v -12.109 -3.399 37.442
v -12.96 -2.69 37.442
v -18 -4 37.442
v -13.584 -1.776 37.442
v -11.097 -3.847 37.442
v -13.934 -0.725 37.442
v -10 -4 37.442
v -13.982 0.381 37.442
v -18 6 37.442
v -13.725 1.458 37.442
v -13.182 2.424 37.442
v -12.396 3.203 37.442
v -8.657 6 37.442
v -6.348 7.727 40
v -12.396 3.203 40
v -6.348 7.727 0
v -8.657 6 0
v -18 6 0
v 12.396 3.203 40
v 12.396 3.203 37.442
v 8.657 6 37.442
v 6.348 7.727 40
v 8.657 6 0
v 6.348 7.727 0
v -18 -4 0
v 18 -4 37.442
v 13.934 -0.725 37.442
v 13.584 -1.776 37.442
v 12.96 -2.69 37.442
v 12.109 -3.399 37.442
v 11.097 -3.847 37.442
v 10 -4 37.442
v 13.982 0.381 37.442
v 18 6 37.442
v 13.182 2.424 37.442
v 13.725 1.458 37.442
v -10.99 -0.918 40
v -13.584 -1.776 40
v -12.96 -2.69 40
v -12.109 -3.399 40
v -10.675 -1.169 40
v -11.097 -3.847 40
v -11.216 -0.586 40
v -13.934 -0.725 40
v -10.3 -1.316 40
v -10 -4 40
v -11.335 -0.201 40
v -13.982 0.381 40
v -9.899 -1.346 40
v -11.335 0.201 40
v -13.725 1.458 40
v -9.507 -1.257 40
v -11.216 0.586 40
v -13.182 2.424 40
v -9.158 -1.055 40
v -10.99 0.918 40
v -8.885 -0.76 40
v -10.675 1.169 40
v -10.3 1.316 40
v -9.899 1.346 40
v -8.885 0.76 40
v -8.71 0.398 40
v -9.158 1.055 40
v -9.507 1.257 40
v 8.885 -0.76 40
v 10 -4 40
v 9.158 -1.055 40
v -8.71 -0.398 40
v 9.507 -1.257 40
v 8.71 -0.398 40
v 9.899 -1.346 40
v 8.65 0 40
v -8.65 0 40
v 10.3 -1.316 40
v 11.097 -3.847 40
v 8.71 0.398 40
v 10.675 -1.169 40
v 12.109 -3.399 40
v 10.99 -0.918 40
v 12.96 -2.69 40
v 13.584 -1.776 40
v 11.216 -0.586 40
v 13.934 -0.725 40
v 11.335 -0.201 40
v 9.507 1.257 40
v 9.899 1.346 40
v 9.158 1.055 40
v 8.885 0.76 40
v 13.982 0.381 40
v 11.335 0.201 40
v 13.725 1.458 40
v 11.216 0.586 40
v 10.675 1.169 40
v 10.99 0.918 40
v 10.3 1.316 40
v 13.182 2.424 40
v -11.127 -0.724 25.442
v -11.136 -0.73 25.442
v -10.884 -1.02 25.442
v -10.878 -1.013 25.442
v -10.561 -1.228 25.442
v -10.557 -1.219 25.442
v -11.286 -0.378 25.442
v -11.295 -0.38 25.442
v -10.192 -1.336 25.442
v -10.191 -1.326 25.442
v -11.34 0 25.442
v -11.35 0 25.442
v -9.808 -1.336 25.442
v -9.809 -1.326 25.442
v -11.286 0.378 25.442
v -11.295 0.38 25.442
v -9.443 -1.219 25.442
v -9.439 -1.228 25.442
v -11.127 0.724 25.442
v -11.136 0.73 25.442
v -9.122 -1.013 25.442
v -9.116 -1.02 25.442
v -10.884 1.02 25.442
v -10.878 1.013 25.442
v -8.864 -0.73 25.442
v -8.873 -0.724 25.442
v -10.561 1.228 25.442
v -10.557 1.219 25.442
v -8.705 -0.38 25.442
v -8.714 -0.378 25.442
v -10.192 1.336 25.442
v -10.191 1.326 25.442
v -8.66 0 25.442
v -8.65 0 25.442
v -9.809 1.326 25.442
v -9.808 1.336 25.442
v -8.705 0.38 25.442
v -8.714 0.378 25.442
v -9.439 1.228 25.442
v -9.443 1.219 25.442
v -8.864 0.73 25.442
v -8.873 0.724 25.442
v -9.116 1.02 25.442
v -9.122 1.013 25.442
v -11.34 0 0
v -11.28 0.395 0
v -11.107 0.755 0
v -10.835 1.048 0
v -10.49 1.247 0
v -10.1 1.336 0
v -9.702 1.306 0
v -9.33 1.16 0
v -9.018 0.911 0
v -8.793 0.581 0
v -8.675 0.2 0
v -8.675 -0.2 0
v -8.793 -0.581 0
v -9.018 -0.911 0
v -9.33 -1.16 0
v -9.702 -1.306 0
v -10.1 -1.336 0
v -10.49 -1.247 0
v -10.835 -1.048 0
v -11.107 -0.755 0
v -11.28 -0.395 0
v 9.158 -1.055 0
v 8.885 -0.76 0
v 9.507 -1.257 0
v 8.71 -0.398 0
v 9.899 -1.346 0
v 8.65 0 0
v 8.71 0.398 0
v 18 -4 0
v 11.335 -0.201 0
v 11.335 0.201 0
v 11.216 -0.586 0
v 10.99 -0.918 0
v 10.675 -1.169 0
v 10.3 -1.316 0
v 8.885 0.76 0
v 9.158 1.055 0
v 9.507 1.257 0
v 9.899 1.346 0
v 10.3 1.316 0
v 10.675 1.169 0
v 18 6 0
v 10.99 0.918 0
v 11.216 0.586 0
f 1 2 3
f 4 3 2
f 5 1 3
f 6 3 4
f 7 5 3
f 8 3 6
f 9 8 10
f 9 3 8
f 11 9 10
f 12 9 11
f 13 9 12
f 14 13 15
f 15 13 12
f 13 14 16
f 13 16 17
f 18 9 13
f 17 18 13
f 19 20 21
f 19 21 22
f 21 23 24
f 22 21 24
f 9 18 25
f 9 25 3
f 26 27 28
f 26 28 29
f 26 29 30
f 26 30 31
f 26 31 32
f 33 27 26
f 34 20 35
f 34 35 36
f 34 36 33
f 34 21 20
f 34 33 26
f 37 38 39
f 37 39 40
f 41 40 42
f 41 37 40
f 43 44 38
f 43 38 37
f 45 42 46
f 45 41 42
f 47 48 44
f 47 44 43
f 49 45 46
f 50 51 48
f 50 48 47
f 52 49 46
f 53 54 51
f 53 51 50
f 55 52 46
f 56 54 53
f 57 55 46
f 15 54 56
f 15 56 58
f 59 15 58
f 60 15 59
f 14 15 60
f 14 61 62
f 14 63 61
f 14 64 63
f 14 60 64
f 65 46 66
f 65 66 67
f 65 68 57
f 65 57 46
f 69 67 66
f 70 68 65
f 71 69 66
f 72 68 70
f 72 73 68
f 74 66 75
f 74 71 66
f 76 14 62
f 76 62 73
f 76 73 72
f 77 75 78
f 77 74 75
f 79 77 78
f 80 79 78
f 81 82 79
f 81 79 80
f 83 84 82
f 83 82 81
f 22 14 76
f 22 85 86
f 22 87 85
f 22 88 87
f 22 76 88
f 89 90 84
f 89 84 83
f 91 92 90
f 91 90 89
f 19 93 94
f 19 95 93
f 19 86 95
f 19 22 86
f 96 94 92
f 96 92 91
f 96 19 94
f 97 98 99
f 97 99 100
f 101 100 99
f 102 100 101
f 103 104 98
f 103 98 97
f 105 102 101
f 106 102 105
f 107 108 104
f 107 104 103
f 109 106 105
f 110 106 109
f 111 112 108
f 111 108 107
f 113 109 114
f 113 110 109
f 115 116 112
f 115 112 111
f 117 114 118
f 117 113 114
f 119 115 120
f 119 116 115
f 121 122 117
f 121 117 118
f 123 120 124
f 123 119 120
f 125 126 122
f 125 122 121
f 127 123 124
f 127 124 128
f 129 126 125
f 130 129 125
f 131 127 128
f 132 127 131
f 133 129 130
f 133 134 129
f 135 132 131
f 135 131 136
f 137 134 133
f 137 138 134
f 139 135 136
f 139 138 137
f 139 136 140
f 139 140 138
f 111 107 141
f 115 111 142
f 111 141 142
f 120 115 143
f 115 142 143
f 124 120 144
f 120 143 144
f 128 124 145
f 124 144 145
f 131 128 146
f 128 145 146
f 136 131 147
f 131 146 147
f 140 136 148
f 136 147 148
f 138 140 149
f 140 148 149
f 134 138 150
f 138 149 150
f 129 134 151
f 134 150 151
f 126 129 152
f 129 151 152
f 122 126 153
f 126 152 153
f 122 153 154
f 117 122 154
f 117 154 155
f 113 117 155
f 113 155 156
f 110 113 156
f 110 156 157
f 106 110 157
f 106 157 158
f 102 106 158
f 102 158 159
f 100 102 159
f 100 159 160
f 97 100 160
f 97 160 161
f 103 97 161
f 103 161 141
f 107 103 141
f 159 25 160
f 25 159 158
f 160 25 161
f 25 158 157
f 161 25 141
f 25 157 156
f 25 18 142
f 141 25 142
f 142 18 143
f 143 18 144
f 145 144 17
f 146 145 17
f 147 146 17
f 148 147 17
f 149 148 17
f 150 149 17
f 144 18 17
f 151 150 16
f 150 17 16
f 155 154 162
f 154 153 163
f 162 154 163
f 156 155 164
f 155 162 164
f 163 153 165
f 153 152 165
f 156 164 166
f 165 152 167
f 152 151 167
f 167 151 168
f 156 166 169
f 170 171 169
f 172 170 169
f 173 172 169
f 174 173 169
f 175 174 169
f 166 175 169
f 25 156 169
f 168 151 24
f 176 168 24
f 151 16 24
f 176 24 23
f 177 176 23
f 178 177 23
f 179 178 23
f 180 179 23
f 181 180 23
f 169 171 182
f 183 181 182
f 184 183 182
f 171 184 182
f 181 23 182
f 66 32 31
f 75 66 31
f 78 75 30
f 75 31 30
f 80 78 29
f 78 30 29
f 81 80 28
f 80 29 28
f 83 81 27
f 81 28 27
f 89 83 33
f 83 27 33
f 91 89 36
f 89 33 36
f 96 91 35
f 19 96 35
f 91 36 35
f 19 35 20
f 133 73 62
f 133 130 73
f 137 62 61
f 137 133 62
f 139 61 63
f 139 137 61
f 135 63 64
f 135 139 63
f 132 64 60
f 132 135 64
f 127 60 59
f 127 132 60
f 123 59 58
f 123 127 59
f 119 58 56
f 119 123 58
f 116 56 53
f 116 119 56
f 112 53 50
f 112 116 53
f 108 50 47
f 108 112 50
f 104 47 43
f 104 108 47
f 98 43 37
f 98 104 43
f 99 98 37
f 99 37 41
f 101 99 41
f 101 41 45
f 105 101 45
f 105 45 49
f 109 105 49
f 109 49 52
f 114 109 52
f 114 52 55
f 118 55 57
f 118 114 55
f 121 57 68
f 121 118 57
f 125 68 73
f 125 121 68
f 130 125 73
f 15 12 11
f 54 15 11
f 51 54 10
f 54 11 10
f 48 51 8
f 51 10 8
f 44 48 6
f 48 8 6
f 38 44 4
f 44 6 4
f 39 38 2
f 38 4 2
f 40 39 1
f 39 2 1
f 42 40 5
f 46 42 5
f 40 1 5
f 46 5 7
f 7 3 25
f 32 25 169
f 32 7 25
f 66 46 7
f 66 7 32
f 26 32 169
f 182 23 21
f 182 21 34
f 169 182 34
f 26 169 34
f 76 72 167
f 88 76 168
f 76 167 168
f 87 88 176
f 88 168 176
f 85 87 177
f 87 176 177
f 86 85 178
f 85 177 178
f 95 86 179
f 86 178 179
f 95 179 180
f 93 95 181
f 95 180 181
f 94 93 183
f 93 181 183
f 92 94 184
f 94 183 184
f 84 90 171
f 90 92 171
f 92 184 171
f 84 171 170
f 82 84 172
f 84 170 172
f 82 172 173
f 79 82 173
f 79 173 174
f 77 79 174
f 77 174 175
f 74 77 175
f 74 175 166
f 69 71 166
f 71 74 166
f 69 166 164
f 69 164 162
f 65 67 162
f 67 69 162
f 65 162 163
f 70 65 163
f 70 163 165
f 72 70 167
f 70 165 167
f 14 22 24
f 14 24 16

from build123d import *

# Parameters (mm, degrees)
SKETCH_1_R          = 1.35
EXTRUDE_1_DEPTH     = 40
EXTRUDE_2_DEPTH     = 10
SKETCH_3_W          = 36
SKETCH_3_H          = 37.441664415
SKETCH_3_R          = 11
EXTRUDE_3_DEPTH     = 5
SKETCH_7_W          = 36
SKETCH_7_H          = 37.441664415
CUT_EXTRUDE_4_DEPTH = 5
CUT_EXTRUDE_START   = -12
SKETCH_8_R          = 1.35
CUT_EXTRUDE_5_DEPTH = 12
SKETCH_10_R         = 1.34
SKETCH_10_R_2       = 1.35
CUT_EXTRUDE_6_DEPTH = 52


with BuildPart() as part:
    # 草图1 → 凸台-拉伸1 (new body)
    with BuildSketch(Plane.XY):
        with BuildLine():
            Line((-10, -4), (10, -4))
            ThreePointArc((10, -4), (13.795550466, -1.262456597), (12.395858862, 3.203101671))
            Line((12.395858862, 3.203101671), (6.347732719, 7.726984491))
            Line((6.347732719, 7.726984491), (0, 7.726984491))
            Line((0, 7.726984491), (-6.347732719, 7.726984491))
            Line((-6.347732719, 7.726984491), (-12.395858862, 3.203101671))
            ThreePointArc((-12.395858862, 3.203101671), (-13.795550466, -1.262456597), (-10, -4))
        make_face()
        with Locations((10, 0)):
            Circle(SKETCH_1_R, mode=Mode.SUBTRACT)
        with Locations((-10, 0)):
            Circle(SKETCH_1_R, mode=Mode.SUBTRACT)
    extrude(amount=EXTRUDE_1_DEPTH)

    # 草图2 → 凸台-拉伸2 (add)
    with BuildSketch(Plane.XZ.offset(4)):
        Polygon((-10, 37.441664415), (-18, 37.441664415), (-18, 0), (0, 0), (10, 0), (18, 0), (18, 37.441664415), align=None)
    extrude(amount=-EXTRUDE_2_DEPTH)

    # 草图3 → 凸台-拉伸3 (add)
    with BuildSketch(Plane.XZ.offset(4)):
        with Locations((0, 18.720832208)):
            Rectangle(SKETCH_3_W, SKETCH_3_H)
        with Locations(Location((0, 16, 0), (0, 0, 270))):
            Circle(SKETCH_3_R, mode=Mode.SUBTRACT)
    extrude(amount=EXTRUDE_3_DEPTH)

    # 草图7 → 切除-拉伸4 (cut)
    with BuildSketch(Plane.XZ.offset(9)):
        with Locations((0, 18.720832208)):
            Rectangle(SKETCH_7_W, SKETCH_7_H)
    extrude(amount=-CUT_EXTRUDE_4_DEPTH, mode=Mode.SUBTRACT)

    # 草图8 → 切除-拉伸5 (cut)
    with BuildSketch(Plane.XY.offset(37.441664415).offset(CUT_EXTRUDE_START)):
        with Locations((10, 0)):
            Circle(SKETCH_8_R)
        with Locations((-10, 0)):
            Circle(SKETCH_8_R)
    extrude(amount=CUT_EXTRUDE_5_DEPTH, mode=Mode.SUBTRACT)

    # 草图10 → 切除-拉伸6 (cut)
    with BuildSketch(Plane(origin=(0, 0, 0), x_dir=(-1, 0, 0), z_dir=(0, 0, -1))):
        with Locations((10, 0)):
            Circle(SKETCH_10_R)
        with Locations((-10, 0)):
            Circle(SKETCH_10_R_2)
    extrude(amount=-CUT_EXTRUDE_6_DEPTH, mode=Mode.SUBTRACT)


solid = part.part
